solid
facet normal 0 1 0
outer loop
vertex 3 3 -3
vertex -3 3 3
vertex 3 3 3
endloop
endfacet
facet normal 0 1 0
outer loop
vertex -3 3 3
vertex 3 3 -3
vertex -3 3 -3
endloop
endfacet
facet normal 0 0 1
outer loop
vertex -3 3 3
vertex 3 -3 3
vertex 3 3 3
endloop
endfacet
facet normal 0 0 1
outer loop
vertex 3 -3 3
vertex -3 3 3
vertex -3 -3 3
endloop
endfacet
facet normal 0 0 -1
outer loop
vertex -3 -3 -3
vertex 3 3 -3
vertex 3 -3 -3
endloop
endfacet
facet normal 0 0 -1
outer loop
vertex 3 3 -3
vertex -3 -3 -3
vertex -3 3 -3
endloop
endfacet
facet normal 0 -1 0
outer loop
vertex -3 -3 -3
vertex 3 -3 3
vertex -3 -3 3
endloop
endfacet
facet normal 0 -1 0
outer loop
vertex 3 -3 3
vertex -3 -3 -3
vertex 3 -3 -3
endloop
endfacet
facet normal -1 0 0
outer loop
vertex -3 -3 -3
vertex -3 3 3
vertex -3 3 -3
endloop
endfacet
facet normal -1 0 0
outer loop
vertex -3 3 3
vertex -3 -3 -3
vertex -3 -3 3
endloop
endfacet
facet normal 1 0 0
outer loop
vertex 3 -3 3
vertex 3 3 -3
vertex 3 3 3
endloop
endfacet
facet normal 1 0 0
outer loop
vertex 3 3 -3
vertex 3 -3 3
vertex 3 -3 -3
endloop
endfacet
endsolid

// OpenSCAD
module erode(r) {
    difference() {
        children();
        minkowski() {
            difference() {
                cube(14, center=true);
                children();
            }
            cube(2*r, center=true);
        }
    }
}

erode(2) cube(10, center=true);
